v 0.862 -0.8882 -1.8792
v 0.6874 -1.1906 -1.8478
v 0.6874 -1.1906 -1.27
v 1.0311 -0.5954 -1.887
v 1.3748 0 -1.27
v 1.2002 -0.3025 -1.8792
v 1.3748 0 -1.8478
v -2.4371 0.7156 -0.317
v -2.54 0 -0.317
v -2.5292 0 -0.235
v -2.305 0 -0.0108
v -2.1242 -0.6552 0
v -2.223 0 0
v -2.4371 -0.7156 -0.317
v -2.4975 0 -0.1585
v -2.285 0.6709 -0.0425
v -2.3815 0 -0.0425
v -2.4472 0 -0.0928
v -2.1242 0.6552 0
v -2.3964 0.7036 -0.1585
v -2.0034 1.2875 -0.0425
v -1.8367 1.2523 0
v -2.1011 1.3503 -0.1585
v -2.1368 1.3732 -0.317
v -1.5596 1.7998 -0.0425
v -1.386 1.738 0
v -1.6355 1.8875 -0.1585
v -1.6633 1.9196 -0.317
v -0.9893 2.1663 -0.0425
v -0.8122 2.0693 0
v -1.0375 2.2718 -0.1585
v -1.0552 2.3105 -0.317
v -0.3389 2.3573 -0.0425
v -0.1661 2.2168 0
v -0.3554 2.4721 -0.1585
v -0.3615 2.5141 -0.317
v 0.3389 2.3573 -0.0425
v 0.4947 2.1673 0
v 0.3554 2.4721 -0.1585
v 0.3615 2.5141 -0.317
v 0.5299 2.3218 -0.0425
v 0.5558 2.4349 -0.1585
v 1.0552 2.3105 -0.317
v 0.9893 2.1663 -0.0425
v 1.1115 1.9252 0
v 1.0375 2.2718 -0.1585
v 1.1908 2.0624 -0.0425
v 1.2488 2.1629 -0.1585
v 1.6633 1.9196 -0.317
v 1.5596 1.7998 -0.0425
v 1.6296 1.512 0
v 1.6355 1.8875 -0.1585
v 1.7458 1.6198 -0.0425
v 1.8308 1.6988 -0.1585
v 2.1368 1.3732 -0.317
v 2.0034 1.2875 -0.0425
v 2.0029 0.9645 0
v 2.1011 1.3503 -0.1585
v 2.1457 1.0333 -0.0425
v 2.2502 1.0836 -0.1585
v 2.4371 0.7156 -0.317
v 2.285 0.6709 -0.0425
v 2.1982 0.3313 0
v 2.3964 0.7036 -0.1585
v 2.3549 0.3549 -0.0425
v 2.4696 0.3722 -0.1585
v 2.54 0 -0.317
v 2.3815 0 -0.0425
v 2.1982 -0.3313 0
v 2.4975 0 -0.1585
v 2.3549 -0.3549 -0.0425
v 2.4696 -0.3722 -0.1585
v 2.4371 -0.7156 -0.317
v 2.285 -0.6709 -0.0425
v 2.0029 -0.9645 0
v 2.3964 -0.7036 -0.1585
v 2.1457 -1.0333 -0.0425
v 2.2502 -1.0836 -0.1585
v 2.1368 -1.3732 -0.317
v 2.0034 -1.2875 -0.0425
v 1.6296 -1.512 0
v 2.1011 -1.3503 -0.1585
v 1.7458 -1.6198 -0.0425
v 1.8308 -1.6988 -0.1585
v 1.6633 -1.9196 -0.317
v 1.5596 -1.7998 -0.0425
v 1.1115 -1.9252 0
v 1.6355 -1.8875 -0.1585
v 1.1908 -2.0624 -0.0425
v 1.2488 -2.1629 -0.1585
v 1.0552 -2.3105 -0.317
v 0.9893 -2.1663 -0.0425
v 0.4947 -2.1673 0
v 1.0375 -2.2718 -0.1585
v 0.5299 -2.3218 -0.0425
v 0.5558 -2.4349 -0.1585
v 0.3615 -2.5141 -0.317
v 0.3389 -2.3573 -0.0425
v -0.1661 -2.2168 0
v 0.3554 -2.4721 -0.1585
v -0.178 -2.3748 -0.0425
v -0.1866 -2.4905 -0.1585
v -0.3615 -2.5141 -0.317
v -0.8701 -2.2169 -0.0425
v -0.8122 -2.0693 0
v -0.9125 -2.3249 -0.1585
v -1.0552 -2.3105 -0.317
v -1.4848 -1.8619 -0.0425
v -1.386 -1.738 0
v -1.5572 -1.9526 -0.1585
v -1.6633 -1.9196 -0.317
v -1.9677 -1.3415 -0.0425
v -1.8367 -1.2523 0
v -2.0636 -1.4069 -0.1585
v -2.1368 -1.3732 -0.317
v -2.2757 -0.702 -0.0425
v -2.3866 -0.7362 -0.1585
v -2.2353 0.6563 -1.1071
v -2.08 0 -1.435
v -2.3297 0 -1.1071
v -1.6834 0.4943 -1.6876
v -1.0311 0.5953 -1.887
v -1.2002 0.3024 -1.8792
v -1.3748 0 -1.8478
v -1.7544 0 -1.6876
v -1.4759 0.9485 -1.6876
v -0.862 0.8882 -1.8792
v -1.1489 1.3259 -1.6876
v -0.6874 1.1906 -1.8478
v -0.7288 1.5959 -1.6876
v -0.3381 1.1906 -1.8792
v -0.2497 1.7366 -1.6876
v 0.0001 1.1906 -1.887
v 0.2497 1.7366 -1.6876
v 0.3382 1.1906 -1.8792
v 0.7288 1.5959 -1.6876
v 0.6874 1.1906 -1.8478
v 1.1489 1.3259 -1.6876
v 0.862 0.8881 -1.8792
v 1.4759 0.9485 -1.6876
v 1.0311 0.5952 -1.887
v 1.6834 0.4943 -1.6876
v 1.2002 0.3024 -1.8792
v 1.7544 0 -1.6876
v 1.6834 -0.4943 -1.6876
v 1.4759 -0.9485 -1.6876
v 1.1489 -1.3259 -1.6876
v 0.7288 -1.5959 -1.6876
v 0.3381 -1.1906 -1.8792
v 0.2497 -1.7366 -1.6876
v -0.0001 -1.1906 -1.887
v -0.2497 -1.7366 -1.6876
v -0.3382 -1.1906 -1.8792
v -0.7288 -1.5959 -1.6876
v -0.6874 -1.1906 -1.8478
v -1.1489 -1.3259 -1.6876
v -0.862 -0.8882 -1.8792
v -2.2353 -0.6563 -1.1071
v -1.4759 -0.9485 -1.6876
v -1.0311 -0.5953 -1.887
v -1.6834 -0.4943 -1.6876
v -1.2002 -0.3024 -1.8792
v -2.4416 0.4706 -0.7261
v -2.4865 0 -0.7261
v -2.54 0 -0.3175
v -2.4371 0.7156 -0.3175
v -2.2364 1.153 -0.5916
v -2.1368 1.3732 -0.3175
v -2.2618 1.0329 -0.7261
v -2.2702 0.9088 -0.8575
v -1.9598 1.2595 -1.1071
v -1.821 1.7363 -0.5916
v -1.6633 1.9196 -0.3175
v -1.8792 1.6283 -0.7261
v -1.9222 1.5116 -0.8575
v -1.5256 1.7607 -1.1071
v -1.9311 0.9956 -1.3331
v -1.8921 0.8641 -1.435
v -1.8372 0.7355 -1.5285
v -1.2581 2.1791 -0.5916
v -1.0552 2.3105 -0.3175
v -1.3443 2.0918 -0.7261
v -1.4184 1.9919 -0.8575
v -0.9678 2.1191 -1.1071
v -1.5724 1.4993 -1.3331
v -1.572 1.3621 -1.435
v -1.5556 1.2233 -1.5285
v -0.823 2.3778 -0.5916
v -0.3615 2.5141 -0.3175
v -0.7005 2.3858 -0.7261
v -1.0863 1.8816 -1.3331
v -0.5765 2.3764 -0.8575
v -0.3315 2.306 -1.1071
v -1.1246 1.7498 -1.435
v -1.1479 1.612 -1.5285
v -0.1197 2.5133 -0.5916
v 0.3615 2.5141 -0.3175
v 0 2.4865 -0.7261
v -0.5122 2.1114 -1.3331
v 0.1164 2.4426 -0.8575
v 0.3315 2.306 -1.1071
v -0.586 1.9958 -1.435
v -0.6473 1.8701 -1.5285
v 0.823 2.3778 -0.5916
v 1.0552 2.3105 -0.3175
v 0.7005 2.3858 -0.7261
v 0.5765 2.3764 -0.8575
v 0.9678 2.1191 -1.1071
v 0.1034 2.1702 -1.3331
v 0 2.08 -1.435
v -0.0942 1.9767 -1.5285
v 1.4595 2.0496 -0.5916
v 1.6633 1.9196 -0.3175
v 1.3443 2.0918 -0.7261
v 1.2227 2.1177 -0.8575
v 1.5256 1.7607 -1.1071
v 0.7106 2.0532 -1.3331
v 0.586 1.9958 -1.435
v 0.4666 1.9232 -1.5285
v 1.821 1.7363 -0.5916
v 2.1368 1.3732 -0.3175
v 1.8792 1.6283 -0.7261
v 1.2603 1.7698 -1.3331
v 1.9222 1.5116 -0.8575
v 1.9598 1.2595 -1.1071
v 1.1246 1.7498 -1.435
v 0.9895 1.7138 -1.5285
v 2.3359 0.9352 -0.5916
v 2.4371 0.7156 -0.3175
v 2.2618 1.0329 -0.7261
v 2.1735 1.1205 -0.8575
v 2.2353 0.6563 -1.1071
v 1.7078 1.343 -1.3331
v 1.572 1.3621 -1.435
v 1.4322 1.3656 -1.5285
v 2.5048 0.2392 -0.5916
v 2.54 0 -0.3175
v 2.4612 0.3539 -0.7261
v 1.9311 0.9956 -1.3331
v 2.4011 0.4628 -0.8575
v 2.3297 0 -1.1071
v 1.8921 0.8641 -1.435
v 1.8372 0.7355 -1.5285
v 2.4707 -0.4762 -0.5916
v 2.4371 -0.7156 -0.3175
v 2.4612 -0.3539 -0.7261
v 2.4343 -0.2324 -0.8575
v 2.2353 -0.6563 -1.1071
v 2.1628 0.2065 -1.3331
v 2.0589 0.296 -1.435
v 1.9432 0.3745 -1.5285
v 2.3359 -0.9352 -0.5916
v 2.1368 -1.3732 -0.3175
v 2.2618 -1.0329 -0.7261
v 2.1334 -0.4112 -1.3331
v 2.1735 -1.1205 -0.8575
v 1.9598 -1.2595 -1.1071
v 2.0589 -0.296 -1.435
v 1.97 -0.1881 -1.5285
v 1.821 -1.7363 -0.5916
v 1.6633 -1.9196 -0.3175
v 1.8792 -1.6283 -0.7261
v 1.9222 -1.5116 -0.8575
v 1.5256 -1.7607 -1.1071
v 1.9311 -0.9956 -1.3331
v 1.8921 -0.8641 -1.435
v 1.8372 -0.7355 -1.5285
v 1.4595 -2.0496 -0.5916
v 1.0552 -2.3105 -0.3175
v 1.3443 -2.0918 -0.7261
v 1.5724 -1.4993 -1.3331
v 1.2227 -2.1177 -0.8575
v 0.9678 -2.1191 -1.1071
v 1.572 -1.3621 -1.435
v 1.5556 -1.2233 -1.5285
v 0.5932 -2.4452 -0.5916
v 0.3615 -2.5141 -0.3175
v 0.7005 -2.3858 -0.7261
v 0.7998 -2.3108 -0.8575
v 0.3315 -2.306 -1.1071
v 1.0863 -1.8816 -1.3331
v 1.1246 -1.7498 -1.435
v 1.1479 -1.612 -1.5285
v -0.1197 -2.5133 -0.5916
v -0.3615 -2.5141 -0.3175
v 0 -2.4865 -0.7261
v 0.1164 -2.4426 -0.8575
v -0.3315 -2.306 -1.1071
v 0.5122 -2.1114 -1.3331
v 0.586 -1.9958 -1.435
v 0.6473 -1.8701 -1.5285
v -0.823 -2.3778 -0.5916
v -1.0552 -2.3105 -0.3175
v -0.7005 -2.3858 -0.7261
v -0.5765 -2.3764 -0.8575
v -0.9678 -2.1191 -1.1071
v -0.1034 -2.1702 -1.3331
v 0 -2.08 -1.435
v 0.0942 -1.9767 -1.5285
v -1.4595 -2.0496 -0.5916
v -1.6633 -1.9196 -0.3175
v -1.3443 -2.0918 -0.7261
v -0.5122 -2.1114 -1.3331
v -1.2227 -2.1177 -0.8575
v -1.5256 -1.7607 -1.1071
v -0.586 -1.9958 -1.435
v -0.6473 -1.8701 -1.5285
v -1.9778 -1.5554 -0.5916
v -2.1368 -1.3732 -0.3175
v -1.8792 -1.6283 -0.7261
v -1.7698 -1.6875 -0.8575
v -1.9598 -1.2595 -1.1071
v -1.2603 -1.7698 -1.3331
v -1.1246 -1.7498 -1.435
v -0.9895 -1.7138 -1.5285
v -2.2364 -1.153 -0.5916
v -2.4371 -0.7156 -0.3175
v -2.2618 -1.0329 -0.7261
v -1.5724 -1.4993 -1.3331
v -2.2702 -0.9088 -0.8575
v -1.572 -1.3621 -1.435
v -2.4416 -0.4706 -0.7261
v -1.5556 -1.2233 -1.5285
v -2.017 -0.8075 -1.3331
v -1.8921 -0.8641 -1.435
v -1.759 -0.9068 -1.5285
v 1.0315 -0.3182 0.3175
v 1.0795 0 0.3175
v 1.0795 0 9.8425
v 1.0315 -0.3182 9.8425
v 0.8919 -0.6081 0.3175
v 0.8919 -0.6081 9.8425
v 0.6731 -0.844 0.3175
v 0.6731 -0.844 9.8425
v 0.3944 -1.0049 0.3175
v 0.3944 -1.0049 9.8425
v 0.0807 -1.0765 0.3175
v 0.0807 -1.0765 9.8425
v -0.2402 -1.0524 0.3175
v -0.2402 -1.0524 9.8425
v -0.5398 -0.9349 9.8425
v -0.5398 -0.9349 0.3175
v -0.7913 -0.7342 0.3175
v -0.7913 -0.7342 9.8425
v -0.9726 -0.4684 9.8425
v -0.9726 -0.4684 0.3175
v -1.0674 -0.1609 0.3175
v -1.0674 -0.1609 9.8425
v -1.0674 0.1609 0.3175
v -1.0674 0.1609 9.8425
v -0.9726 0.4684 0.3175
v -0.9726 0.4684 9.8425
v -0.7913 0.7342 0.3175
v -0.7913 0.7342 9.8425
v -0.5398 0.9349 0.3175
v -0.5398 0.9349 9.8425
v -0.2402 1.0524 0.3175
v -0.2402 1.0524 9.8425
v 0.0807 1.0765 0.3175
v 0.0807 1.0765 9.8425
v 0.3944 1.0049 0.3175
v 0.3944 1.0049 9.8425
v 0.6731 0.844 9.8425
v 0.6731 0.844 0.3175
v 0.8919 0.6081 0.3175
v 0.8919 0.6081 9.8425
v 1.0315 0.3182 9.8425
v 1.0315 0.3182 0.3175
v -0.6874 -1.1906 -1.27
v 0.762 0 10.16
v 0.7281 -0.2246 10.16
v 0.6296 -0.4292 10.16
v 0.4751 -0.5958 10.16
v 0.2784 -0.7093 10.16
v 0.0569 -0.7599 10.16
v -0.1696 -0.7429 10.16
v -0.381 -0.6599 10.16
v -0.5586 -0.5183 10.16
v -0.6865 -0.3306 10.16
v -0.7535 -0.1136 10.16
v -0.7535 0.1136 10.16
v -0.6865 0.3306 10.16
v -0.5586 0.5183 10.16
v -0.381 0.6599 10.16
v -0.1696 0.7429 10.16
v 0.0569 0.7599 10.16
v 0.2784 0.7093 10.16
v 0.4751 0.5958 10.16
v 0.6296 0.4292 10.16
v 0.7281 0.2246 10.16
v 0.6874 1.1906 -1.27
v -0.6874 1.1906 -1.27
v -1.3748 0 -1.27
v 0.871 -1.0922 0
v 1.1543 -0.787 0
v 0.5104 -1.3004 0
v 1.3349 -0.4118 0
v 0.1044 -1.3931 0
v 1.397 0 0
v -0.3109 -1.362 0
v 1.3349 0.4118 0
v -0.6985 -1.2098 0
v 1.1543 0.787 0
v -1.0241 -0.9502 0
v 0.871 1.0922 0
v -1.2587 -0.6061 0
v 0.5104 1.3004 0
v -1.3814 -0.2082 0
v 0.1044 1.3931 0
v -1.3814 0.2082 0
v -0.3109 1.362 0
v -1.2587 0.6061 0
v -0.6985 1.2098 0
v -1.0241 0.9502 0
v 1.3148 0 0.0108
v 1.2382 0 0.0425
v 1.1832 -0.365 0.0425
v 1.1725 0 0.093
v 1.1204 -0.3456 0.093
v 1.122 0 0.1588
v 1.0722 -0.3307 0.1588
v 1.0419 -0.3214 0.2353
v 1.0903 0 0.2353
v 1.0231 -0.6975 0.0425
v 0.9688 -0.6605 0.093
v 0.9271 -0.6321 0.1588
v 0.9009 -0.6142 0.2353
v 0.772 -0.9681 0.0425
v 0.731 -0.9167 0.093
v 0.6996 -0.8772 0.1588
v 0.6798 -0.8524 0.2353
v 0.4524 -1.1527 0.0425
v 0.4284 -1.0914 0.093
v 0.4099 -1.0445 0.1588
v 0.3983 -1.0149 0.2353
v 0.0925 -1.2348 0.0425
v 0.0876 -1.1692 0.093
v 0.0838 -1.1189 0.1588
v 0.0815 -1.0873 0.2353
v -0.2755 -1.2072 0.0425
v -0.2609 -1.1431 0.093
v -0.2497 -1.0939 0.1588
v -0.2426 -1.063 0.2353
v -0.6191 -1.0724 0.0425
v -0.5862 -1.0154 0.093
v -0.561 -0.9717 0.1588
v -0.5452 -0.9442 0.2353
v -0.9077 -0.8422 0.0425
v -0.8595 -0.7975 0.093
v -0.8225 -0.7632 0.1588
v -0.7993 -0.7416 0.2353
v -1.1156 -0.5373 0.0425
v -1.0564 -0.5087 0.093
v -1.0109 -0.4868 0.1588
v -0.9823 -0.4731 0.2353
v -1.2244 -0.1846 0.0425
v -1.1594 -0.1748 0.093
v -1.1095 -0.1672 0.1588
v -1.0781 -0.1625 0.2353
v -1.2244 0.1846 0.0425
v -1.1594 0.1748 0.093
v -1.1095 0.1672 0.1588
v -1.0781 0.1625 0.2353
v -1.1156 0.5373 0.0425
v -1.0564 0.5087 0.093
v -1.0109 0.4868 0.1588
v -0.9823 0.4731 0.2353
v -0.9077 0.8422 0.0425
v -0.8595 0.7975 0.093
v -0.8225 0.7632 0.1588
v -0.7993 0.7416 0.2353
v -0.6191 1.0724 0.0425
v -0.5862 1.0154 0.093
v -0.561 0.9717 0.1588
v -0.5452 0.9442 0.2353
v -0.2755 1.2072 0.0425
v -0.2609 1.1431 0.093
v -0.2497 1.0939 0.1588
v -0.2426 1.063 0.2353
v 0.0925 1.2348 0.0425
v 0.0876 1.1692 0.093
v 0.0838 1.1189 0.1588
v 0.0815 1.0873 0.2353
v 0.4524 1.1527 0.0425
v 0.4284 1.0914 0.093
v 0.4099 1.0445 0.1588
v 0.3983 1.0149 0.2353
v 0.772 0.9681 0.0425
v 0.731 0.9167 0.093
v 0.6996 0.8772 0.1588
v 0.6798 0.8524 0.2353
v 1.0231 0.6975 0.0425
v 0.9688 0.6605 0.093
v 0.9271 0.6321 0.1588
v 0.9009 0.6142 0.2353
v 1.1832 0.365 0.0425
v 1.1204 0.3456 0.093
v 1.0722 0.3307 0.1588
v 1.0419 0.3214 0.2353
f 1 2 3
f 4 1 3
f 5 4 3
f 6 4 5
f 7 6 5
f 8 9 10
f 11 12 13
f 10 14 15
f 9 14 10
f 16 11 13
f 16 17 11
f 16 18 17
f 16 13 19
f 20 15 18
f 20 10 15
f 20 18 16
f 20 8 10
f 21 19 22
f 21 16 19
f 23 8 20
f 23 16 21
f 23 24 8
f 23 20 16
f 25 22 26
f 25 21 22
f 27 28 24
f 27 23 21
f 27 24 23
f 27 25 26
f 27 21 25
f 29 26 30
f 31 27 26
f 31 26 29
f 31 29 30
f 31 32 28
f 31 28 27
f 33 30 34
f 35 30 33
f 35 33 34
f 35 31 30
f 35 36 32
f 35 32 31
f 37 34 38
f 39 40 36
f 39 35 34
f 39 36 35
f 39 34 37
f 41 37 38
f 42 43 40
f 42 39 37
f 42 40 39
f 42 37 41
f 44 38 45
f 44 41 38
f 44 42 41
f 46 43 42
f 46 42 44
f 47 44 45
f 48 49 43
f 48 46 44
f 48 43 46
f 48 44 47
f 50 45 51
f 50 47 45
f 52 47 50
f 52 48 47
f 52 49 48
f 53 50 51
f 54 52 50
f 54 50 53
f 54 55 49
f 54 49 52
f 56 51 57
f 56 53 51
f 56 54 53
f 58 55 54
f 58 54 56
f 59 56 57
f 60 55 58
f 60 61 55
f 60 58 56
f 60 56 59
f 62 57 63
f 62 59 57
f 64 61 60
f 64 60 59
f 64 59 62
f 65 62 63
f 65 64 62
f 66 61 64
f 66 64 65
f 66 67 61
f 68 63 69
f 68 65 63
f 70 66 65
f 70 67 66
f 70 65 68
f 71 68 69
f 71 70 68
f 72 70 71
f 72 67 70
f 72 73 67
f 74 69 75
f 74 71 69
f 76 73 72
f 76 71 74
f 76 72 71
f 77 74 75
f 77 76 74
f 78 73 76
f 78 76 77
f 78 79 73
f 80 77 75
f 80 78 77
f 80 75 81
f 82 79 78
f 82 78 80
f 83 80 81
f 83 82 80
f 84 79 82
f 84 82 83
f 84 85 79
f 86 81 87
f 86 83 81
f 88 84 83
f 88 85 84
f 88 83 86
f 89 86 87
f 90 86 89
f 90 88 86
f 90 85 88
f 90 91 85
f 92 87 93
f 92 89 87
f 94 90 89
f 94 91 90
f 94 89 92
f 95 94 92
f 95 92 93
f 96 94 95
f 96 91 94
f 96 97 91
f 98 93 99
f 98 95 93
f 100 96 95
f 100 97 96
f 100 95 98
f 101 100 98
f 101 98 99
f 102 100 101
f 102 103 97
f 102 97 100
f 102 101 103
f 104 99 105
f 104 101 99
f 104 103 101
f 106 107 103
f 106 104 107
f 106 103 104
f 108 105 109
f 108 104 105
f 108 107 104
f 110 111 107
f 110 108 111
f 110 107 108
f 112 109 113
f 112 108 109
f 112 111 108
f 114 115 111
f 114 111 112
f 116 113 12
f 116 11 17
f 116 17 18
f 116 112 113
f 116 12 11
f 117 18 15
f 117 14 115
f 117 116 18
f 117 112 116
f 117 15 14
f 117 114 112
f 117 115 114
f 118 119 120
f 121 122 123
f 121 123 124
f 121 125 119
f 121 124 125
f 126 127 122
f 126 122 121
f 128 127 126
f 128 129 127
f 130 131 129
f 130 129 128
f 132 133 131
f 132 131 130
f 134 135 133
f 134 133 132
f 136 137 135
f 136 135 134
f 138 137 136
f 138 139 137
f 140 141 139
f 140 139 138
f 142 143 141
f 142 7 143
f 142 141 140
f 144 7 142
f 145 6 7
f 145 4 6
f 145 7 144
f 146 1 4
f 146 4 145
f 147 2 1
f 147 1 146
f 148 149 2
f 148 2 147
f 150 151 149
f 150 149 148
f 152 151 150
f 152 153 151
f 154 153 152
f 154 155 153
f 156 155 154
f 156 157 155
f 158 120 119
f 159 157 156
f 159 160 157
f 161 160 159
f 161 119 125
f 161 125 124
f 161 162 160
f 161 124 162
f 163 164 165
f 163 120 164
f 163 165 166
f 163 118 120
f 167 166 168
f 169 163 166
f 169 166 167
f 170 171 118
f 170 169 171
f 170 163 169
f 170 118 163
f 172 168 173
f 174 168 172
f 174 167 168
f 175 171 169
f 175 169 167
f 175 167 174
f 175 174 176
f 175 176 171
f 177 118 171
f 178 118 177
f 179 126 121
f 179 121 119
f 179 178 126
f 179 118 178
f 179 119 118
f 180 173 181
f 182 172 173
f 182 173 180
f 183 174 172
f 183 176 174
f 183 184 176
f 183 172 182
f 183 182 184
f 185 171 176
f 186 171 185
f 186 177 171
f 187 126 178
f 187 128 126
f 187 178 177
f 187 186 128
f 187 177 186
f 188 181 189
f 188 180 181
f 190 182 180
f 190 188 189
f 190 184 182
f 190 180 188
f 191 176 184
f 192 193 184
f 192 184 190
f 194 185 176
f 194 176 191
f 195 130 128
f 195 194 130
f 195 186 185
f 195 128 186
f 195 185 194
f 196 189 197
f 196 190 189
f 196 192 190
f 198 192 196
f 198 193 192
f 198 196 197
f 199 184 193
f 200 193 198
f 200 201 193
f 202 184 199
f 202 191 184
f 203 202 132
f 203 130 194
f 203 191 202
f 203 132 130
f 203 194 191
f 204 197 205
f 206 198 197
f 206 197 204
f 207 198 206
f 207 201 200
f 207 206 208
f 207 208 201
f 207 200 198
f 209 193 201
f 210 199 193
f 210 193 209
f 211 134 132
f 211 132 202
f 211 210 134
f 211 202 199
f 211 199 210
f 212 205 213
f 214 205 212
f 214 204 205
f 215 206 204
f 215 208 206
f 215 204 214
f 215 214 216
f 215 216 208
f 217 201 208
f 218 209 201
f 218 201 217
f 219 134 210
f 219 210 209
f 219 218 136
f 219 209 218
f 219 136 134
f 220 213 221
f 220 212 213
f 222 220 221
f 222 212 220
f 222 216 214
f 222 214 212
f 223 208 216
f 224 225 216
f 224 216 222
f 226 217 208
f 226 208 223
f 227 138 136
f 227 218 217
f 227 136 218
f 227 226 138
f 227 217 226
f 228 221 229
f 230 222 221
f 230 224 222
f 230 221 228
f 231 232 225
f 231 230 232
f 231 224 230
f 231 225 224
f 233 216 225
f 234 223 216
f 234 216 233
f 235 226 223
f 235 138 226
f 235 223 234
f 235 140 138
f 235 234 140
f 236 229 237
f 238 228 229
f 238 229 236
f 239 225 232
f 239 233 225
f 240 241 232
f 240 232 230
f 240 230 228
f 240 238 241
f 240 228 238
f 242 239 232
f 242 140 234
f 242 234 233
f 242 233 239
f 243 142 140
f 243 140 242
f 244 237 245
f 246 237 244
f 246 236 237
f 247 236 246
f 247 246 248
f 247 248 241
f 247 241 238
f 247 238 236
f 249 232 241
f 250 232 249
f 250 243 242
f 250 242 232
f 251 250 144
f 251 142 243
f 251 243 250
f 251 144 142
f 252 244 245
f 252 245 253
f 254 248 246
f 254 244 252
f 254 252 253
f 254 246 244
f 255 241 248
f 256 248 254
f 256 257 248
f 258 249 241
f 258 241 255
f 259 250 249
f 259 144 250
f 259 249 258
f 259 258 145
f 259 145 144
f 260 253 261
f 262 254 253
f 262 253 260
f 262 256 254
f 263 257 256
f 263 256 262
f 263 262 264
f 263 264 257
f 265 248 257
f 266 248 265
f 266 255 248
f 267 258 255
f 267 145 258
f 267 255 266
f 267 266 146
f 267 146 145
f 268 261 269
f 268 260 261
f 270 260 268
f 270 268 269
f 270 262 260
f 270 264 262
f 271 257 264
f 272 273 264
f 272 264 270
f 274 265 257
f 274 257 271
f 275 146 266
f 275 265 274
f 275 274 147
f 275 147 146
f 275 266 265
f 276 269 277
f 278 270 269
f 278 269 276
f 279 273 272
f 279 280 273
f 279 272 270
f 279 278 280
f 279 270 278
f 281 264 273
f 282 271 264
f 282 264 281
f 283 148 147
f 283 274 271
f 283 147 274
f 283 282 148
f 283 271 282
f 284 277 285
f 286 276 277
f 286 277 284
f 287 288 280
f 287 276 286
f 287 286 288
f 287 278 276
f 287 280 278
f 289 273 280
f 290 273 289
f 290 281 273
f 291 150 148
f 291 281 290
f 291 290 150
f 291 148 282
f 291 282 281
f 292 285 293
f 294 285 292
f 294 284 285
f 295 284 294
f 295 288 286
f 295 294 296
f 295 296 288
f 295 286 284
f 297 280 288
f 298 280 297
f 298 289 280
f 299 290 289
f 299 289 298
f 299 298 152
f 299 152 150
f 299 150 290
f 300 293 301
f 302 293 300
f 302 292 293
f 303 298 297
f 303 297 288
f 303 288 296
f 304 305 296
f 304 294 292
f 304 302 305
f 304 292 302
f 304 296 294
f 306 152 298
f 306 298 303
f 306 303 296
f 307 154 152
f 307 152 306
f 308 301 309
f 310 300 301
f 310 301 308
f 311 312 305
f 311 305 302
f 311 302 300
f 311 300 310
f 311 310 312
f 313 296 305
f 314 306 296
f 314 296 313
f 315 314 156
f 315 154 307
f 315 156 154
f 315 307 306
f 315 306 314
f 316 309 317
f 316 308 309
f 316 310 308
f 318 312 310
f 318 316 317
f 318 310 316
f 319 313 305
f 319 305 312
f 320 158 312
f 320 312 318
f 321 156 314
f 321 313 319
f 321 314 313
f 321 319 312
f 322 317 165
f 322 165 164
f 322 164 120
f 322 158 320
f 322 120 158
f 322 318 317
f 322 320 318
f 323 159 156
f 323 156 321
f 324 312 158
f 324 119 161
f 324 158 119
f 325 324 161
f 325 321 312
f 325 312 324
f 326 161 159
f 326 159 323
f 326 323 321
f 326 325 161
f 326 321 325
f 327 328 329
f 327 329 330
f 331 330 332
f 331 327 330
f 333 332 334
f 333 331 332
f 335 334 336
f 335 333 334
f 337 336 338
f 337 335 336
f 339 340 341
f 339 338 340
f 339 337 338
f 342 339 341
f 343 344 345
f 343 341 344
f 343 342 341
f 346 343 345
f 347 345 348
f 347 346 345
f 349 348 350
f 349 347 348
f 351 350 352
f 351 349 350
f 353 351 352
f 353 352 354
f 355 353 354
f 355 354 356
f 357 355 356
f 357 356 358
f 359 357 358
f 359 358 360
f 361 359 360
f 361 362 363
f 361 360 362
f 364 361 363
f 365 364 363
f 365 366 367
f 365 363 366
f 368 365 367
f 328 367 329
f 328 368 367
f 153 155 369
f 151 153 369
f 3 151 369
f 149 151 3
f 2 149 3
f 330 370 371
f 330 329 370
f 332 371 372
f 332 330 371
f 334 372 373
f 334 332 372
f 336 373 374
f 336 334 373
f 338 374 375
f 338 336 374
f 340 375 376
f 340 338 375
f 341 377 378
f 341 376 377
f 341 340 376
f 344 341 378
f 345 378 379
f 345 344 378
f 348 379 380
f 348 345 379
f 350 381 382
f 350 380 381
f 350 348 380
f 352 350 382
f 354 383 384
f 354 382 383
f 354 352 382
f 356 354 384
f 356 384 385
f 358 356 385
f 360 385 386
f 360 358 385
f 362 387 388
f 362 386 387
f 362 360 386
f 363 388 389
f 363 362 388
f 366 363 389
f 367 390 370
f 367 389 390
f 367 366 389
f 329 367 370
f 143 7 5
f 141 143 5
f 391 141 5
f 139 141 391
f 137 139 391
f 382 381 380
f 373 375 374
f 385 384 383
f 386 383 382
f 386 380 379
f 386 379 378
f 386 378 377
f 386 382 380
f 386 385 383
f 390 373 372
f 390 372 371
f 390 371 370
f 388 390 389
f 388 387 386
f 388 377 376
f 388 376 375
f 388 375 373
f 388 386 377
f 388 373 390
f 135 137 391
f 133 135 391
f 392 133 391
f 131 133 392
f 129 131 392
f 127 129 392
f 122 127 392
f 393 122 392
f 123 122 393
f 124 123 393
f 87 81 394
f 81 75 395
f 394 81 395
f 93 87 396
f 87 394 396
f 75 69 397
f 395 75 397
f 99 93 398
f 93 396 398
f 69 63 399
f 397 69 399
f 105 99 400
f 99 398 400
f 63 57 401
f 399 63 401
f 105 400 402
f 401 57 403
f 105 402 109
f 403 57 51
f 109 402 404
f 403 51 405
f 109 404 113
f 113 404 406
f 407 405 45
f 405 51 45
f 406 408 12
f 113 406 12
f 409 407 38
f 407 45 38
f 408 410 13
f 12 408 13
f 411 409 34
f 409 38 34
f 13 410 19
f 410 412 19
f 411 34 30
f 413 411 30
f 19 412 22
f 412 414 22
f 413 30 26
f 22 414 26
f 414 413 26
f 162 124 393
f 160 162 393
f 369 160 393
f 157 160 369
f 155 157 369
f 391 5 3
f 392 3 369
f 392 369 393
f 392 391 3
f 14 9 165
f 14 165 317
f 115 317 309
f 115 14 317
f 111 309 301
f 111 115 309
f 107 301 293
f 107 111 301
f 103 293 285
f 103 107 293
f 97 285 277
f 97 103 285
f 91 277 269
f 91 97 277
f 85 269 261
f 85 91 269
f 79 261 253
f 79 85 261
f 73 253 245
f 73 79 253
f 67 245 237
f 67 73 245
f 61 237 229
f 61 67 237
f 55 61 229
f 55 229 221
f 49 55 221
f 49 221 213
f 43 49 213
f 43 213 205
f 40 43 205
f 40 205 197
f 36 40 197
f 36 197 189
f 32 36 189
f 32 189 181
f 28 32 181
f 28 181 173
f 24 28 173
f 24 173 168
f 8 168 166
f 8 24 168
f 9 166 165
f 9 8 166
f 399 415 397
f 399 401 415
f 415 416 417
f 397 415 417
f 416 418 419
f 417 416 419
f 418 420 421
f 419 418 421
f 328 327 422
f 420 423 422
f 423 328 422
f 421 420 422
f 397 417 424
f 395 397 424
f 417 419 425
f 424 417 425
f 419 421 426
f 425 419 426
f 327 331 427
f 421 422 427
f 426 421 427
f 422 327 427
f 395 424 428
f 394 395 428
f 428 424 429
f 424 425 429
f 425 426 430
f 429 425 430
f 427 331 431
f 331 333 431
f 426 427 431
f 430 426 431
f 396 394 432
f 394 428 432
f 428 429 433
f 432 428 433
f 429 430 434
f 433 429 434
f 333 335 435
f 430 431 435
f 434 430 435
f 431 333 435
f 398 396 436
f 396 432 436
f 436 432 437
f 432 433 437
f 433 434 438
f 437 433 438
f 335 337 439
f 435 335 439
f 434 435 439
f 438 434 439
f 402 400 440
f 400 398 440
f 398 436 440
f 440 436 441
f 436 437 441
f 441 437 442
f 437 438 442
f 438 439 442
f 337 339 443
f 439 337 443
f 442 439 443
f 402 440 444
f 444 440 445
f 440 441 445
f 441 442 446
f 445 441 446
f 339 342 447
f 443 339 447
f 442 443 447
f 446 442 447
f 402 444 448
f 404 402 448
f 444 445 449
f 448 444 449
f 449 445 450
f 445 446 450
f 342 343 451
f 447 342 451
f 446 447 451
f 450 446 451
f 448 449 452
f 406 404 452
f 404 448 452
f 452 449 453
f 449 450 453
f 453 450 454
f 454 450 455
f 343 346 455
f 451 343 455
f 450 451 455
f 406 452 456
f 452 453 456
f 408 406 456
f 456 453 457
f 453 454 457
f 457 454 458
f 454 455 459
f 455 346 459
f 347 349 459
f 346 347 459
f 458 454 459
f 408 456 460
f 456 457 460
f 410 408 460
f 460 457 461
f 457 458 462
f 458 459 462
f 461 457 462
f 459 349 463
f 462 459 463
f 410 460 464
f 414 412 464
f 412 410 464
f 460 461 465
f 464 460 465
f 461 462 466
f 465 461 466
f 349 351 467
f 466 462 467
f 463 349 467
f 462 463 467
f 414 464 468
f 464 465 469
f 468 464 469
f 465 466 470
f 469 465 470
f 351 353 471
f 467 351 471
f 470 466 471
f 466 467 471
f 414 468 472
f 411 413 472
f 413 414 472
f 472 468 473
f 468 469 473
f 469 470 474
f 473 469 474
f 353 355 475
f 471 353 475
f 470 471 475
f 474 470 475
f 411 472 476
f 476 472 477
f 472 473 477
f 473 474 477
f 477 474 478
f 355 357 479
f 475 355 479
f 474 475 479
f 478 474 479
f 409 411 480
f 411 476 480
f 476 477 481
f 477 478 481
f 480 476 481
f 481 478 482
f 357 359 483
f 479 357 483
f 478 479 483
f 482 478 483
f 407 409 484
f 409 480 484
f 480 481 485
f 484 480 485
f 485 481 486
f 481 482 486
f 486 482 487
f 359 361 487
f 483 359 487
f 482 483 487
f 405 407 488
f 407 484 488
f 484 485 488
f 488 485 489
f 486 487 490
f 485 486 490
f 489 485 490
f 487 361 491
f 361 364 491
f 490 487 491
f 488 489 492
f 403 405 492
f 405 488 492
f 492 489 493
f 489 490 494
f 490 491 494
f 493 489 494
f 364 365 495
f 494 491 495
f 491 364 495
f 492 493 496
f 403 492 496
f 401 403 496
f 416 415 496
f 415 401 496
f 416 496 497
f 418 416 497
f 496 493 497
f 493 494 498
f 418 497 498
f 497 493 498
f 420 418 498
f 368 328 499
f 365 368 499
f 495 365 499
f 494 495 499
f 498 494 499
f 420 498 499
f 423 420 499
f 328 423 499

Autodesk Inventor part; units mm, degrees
ref_plane "YZ Plane" through (0, 0, 0) normal (1, 0, 0) x (0, 1, 0)
ref_plane "XZ Plane" through (0, 0, 0) normal (0, 1, 0) x (-1, 0, 0)
ref_plane "XY Plane" through (0, 0, 0) normal (0, 0, 1) x (1, 0, 0)
sketch "Sketch1" plane through (0, 0, 0) normal (0, 0, 1) x (1, 0, 0)
  circle A0 centre (0, 0) radius 1.0795
  dimension "d0" = 2.159
extrude "Extrusion1" add sketch "Sketch1" along normal blind 10.16
sketch "Sketch2" plane through (0, 0, 0) normal (0, 0, -1) x (-1, 0, 0)
  circle A0 centre (0, 0) radius 2.54
  dimension "d3" = 5.08
extrude "Extrusion2" add sketch "Sketch2" along normal blind 1.905
fillet "Fillet1" radius 1.5875 1 edges at (2.54, 0, -1.905)
fillet "Fillet2" radius 0.3175 1 edges at (-1.0795, 0, 0)
fillet "Fillet3" radius 0.3175 1 edges at (2.54, 0, 0)
chamfer "Chamfer1" distance 0.3175 angle 45 1 edges at (-1.0795, 0, 10.16)
sketch "Sketch3" plane through (0, 0, -1.905) normal (0, 0, -1) x (-1, 0, 0)
  line L0 (-1.3748, 0) -> (-0.6874, 1.1906)
  line L1 (-0.6874, 1.1906) -> (0.6874, 1.1906)
  line L2 (0.6874, 1.1906) -> (1.3748, 0)
  line L3 (1.3748, 0) -> (0.6874, -1.1906)
  line L4 (0.6874, -1.1906) -> (-0.6874, -1.1906)
  line L5 (-0.6874, -1.1906) -> (-1.3748, 0)
  point P0 (0, 0)
  point P1 (0, 0)
  dimension "d17" = 2.3813
extrude "Extrusion3" cut sketch "Sketch3" against normal blind 0.635
thread "Thread1" size "4-40 UNC" class "2A" standard "ANSI Unified Screw Threads" full length
properties part number "Axel - Male" material "PPS Plastic"
